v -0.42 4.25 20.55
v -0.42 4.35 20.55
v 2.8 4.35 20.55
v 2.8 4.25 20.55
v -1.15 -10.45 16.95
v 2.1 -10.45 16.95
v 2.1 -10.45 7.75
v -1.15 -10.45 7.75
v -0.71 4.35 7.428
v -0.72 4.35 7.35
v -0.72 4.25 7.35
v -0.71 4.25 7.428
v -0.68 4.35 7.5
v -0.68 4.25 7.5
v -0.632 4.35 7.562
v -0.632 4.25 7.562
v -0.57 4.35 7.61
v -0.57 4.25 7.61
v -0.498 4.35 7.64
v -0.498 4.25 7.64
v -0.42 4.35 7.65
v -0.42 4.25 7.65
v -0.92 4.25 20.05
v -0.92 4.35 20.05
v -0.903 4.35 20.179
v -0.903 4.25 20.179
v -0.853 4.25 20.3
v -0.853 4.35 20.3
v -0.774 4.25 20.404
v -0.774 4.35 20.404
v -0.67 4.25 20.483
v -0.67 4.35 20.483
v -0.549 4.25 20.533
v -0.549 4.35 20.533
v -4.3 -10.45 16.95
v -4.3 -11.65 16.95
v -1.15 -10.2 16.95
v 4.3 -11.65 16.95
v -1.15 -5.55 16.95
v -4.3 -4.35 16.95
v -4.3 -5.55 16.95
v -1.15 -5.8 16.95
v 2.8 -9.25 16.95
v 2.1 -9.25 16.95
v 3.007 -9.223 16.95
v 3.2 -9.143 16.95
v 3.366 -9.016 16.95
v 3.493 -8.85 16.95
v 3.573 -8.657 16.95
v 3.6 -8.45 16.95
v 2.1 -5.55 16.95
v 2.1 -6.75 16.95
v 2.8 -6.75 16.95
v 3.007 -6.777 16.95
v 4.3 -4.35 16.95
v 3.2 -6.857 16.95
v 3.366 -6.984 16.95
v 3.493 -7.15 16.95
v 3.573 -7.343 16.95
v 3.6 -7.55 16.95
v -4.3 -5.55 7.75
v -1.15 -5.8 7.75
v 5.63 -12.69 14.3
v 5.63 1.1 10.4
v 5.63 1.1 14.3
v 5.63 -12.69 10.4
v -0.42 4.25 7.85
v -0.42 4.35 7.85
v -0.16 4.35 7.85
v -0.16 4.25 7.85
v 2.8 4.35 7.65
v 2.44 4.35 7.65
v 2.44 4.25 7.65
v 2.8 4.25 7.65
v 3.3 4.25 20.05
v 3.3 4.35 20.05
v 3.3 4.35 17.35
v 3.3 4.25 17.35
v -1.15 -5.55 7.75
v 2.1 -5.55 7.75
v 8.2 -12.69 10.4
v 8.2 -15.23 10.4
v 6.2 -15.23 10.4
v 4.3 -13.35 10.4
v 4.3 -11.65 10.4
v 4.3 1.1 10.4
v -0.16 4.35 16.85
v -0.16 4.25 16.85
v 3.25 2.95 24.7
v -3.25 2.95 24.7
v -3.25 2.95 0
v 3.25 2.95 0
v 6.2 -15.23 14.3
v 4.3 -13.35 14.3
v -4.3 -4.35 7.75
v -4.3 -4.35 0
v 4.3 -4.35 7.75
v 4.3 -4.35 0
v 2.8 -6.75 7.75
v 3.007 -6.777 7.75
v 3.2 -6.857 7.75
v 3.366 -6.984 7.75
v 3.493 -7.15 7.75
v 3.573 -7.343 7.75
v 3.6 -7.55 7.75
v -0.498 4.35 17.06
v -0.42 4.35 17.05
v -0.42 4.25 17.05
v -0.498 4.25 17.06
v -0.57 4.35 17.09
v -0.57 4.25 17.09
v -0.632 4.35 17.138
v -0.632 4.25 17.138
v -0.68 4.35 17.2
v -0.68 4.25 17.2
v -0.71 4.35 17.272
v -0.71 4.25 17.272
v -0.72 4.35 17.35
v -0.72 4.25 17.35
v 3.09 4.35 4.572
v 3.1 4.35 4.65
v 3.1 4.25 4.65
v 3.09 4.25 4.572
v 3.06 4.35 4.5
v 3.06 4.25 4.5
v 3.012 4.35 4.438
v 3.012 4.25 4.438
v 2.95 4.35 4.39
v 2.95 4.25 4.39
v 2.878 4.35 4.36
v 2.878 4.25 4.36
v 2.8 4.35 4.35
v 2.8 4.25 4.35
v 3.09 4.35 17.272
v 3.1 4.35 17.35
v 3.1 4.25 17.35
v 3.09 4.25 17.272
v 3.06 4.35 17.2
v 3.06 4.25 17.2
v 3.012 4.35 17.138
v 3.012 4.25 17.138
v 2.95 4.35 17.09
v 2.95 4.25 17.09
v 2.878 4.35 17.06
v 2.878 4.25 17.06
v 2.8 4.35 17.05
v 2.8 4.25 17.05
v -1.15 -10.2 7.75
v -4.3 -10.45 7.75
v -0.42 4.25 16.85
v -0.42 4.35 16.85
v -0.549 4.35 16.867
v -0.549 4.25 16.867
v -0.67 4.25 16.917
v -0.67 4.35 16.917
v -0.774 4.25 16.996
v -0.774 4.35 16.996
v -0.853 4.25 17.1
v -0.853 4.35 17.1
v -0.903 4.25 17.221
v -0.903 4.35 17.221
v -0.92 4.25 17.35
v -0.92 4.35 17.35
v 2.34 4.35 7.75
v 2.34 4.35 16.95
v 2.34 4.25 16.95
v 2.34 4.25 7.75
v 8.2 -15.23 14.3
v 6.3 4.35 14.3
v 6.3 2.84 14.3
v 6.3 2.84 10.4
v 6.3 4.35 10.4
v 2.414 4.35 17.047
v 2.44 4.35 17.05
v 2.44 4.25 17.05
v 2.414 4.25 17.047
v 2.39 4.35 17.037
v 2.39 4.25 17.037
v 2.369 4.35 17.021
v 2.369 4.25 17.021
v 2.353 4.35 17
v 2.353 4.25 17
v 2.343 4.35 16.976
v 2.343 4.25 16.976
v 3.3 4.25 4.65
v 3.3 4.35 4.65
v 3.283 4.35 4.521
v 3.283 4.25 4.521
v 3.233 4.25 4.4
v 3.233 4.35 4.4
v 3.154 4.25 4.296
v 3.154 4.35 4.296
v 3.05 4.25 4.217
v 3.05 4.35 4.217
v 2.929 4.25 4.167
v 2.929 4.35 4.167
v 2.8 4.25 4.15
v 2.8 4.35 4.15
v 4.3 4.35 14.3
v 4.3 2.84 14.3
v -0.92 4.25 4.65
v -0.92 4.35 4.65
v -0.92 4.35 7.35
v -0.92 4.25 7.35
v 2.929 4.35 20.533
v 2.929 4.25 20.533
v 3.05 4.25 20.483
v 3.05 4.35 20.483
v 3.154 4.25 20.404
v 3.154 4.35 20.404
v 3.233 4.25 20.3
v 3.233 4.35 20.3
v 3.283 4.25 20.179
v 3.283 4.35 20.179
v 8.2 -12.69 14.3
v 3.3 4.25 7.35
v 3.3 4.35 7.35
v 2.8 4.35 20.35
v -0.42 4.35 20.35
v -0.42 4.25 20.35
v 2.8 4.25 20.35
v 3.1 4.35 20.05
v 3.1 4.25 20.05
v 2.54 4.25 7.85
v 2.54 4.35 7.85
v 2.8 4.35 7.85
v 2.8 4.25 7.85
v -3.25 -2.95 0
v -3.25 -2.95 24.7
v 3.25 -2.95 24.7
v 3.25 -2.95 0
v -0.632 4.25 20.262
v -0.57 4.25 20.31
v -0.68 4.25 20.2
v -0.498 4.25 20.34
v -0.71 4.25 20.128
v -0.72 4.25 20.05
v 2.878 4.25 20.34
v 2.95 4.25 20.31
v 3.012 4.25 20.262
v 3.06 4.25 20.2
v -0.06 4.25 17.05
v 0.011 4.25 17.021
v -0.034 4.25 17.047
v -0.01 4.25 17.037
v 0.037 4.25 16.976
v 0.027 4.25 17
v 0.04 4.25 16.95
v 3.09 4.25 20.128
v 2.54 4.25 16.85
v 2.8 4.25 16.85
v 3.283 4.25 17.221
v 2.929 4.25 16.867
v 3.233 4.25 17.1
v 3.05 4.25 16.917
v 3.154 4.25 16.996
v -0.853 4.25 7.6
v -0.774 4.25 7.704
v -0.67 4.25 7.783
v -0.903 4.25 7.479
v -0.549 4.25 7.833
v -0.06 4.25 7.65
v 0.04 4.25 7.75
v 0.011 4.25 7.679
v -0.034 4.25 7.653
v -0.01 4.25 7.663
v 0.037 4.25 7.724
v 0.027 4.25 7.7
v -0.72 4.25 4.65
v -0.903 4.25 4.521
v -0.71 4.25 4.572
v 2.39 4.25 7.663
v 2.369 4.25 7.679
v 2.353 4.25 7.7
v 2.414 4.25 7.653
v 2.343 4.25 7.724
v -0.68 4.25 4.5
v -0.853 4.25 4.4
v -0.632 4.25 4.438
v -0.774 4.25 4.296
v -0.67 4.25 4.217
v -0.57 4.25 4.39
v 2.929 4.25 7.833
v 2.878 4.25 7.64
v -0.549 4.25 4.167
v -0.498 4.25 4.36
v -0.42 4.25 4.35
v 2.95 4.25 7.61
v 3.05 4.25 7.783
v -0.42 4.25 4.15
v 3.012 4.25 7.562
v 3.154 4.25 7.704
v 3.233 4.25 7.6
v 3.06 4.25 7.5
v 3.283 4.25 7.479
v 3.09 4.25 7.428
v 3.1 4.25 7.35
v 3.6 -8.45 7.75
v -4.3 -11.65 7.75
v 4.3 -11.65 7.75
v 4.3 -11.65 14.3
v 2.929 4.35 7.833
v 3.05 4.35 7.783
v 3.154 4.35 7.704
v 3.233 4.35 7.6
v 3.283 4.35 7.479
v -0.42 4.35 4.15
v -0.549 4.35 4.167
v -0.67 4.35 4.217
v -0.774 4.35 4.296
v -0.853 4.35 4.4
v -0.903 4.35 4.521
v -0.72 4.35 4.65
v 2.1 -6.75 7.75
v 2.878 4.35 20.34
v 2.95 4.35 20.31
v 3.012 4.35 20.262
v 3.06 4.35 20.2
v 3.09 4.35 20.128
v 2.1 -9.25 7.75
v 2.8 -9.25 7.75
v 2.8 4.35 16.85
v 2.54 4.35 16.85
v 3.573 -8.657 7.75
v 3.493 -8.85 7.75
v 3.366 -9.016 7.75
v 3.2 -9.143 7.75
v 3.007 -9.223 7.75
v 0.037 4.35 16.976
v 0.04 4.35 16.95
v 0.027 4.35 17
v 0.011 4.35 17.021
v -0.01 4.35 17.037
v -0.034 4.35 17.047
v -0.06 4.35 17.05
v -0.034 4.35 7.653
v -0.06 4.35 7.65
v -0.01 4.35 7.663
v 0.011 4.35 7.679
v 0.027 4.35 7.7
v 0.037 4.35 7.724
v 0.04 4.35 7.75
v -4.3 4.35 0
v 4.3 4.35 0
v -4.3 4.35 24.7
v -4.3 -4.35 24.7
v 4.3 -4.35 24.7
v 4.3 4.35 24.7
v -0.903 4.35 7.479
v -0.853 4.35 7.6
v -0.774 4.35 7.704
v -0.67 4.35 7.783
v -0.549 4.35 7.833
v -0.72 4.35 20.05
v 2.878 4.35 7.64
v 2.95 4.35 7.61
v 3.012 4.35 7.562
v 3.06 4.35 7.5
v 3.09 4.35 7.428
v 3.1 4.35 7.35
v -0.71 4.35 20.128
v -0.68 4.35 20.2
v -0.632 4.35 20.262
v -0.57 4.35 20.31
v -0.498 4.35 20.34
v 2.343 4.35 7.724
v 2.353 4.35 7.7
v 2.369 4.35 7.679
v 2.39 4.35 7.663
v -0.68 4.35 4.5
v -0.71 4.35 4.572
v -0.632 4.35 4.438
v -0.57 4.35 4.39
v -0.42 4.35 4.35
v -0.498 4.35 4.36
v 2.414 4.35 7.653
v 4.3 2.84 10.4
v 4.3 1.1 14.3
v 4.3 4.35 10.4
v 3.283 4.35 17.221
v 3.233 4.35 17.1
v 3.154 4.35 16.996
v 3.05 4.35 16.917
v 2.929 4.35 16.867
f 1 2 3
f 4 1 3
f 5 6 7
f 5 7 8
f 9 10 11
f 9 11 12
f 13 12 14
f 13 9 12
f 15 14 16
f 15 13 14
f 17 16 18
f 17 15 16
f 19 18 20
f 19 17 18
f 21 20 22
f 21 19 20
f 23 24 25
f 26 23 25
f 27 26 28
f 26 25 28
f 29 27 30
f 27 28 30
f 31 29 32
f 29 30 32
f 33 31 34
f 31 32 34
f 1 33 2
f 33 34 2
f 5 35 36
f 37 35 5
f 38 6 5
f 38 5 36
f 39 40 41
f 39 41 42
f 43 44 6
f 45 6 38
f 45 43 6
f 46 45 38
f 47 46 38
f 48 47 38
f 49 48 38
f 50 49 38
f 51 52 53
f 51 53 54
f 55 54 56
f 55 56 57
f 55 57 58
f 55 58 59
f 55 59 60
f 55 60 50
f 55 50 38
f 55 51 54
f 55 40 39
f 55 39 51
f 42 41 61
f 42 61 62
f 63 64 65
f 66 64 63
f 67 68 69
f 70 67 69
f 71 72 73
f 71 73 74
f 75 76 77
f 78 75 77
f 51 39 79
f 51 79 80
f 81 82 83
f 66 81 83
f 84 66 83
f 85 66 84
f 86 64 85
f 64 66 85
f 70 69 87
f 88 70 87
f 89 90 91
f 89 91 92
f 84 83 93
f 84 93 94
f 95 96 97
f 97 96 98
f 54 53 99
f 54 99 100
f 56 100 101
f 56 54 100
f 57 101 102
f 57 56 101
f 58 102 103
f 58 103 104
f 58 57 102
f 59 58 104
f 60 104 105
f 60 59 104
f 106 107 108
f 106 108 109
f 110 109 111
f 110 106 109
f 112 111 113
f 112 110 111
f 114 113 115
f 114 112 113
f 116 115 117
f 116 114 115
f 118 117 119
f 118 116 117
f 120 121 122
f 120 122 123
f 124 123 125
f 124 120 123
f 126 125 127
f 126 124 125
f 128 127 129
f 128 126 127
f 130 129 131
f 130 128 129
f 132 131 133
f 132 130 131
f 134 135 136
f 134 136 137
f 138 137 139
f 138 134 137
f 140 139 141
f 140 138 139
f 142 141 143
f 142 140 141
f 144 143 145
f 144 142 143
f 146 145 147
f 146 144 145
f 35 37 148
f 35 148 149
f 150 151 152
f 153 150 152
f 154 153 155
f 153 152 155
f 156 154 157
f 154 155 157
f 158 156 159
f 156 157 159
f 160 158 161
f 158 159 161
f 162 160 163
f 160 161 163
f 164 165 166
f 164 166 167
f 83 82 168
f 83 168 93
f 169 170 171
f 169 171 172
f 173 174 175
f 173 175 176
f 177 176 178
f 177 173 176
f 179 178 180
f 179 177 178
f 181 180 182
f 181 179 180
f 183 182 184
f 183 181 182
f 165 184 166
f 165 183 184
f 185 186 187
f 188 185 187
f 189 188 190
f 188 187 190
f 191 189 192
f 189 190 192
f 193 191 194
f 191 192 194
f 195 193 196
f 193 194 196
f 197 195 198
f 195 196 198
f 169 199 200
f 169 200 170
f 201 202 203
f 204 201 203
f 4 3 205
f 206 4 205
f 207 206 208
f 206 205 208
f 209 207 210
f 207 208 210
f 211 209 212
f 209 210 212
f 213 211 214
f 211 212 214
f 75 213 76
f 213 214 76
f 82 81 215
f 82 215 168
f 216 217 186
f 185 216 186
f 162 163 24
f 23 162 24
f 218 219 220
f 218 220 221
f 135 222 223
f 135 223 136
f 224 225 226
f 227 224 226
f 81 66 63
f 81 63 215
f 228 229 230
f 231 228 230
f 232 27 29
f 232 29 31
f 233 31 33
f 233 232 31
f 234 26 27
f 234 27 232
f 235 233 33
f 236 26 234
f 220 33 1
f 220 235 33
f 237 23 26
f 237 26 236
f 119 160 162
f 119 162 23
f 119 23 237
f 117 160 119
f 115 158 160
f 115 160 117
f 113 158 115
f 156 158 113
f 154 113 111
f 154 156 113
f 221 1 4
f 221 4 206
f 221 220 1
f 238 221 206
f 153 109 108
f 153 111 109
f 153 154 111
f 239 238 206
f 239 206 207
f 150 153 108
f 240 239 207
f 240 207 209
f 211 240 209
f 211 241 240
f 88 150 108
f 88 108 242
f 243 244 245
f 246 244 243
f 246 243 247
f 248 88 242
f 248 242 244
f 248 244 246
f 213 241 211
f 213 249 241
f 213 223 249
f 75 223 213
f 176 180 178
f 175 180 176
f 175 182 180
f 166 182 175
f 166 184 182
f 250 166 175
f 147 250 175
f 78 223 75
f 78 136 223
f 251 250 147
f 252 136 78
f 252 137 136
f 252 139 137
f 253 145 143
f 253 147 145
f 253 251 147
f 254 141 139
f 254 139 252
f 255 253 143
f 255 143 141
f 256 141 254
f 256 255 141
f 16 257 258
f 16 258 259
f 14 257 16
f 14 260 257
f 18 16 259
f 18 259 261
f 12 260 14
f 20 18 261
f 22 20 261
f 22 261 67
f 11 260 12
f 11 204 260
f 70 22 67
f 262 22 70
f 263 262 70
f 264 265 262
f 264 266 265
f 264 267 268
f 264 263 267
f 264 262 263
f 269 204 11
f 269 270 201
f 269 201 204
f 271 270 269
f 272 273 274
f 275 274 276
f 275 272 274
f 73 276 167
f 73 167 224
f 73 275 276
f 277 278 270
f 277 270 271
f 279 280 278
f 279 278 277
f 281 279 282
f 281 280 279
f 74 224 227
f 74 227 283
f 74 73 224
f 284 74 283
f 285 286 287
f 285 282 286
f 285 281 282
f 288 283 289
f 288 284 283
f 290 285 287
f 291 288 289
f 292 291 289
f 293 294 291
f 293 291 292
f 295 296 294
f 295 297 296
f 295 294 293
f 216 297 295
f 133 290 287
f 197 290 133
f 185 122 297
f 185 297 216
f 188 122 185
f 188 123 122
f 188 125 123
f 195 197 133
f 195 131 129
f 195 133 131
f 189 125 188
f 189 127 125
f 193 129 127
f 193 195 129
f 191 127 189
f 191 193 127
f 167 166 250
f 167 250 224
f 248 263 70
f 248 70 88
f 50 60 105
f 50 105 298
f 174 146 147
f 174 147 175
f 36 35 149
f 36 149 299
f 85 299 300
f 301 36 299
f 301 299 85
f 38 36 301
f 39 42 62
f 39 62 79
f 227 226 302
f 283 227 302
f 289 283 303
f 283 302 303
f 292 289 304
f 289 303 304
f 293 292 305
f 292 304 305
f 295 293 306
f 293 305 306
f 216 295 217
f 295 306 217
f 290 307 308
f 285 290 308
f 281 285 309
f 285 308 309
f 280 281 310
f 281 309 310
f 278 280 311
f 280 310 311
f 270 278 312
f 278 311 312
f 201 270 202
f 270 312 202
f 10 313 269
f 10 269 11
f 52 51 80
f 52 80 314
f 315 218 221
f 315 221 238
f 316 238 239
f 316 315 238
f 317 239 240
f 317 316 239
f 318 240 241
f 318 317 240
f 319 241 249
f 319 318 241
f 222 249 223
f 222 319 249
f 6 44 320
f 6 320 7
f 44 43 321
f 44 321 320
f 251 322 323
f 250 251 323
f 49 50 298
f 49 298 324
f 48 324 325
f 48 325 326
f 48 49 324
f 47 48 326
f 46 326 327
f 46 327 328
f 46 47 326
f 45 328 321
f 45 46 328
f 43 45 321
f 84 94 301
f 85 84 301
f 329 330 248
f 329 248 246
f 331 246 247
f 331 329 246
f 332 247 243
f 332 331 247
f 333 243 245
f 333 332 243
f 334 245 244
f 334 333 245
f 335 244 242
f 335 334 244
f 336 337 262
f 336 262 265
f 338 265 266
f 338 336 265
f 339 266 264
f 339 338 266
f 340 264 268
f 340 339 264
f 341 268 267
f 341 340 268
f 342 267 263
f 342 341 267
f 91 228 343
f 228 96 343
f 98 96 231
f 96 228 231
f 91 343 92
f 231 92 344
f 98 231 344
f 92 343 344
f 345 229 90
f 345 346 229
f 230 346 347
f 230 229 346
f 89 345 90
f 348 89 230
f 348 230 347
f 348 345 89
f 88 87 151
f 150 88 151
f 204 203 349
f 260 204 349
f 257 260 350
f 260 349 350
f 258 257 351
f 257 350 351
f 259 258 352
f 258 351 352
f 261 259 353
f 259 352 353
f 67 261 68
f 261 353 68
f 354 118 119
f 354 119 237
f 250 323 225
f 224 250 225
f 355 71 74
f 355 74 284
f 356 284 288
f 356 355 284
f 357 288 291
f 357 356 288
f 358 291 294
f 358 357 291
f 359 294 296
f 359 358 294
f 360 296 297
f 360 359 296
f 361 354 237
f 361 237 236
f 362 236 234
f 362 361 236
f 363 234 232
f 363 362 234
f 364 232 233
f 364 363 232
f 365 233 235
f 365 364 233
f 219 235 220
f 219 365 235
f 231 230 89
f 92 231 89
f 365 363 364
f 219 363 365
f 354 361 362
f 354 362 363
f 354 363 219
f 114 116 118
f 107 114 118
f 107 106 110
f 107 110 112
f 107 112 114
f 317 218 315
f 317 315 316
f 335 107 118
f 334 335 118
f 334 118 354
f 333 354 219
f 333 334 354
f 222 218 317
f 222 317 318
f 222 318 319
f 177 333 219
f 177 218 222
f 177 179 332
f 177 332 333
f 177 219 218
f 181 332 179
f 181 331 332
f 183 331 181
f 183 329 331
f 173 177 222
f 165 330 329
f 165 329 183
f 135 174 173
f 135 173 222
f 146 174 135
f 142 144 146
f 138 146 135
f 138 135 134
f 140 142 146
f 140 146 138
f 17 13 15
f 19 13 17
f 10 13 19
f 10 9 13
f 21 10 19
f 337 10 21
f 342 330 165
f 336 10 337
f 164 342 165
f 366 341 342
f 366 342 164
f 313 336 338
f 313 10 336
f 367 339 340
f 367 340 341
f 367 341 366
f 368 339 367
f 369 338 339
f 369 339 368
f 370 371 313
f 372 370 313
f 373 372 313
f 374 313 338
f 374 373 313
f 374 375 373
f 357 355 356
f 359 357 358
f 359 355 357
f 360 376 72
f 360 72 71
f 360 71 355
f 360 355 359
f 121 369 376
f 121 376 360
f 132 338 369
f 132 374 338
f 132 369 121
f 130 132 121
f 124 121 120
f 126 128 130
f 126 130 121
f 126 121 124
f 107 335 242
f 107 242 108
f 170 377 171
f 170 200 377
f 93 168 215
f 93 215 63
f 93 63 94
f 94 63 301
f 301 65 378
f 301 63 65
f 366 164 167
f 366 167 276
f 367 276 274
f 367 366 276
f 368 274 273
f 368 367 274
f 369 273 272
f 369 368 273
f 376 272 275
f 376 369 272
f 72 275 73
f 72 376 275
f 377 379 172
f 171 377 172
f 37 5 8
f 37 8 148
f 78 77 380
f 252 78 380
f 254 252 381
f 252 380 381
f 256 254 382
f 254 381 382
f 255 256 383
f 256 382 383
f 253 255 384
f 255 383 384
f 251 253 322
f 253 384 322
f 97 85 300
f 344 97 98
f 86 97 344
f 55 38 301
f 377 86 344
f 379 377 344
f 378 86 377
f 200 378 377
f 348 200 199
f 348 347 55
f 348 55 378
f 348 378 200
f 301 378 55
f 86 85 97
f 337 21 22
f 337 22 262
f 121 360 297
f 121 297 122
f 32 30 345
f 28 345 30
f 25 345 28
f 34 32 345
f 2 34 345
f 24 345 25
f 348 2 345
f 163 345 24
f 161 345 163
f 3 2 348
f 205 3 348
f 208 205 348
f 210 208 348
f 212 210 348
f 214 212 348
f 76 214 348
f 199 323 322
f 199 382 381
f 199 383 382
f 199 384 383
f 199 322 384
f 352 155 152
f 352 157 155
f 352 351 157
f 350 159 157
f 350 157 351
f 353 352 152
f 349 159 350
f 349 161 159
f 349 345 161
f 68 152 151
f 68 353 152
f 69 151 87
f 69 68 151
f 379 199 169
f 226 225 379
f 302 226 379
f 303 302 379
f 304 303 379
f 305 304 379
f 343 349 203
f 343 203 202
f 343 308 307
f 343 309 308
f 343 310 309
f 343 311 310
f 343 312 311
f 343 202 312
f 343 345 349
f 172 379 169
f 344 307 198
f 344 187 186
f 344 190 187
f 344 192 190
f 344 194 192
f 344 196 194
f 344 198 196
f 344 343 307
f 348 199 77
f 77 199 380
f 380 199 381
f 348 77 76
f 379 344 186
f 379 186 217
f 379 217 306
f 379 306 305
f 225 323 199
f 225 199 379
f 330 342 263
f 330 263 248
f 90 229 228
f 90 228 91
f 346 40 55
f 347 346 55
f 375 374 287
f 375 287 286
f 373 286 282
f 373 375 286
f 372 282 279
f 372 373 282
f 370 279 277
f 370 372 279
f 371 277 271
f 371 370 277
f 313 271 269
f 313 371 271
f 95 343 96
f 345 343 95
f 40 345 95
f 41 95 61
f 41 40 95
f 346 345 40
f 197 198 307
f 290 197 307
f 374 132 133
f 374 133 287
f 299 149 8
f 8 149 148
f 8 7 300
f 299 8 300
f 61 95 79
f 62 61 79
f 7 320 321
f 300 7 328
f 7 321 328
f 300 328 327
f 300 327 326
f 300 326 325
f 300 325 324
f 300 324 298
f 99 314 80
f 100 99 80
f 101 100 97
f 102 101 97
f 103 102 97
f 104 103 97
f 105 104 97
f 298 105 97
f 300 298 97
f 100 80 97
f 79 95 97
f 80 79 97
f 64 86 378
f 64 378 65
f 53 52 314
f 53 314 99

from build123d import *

# Parameters (mm, degrees)
SKETCH1_W                = 8.6
SKETCH1_H                = 8.7
SKETCH1_W_2              = 6.5
SKETCH1_H_2              = 5.9
BOSS_EXTRUDE1_DEPTH      = 24.7
SKETCH2_W                = 2
SKETCH2_H                = 1.51
BOSS_EXTRUDE2_DEPTH      = 1.95
BOSS_EXTRUDE2_DEPTH_BACK = 1.95
BOSS_EXTRUDE3_DEPTH      = 4.6
BOSS_EXTRUDE3_DEPTH_BACK = 4.6
CUT_EXTRUDE1_DEPTH       = 0.1


with BuildPart() as part:
    # Sketch1 → Boss-Extrude1 (new body)
    with BuildSketch(Plane.XY):
        Rectangle(SKETCH1_W, SKETCH1_H)
        Rectangle(SKETCH1_W_2, SKETCH1_H_2, mode=Mode.SUBTRACT)
    extrude(amount=BOSS_EXTRUDE1_DEPTH)

    # Sketch2 → Boss-Extrude2 (add, two sides)
    with BuildSketch(Plane.XY.offset(12.35)) as boss_extrude2_sk:
        with Locations((5.3, 3.595)):
            Rectangle(SKETCH2_W, SKETCH2_H)
        Polygon((4.3, 1.1), (5.63, 1.1), (5.63, -12.69), (8.2, -12.69), (8.2, -15.23), (6.2, -15.23), (4.3, -13.35), align=None)
    extrude(amount=BOSS_EXTRUDE2_DEPTH)
    extrude(boss_extrude2_sk.sketch, amount=-BOSS_EXTRUDE2_DEPTH_BACK)

    # Sketch3 → Boss-Extrude3 (add, two sides)
    with BuildSketch(Plane.XY.offset(12.35)) as boss_extrude3_sk:
        with BuildLine():
            Line((4.3, -4.35), (-4.3, -4.35))
            Line((-4.3, -4.35), (-4.3, -5.55))
            Line((-4.3, -5.55), (-1.15, -5.8))
            Line((-1.15, -5.8), (-1.15, -5.55))
            Line((-1.15, -5.55), (2.1, -5.55))
            Line((2.1, -5.55), (2.1, -6.75))
            Line((2.1, -6.75), (2.8, -6.75))
            ThreePointArc((2.8, -6.75), (3.365685425, -6.984314575), (3.6, -7.55))
            Line((3.6, -7.55), (3.6, -8.45))
            ThreePointArc((3.6, -8.45), (3.365685425, -9.015685425), (2.8, -9.25))
            Line((2.8, -9.25), (2.1, -9.25))
            Line((2.1, -9.25), (2.1, -10.45))
            Line((2.1, -10.45), (-1.15, -10.45))
            Line((-1.15, -10.45), (-1.15, -10.2))
            Line((-1.15, -10.2), (-4.3, -10.45))
            Line((-4.3, -10.45), (-4.3, -11.65))
            Line((-4.3, -11.65), (4.3, -11.65))
            Line((4.3, -11.65), (4.3, -4.35))
        make_face()
    extrude(amount=BOSS_EXTRUDE3_DEPTH)
    extrude(boss_extrude3_sk.sketch, amount=-BOSS_EXTRUDE3_DEPTH_BACK)

    # Sketch4 → Cut-Extrude1 (cut)
    with BuildSketch(Plane(origin=(0, 4.35, 0), x_dir=(1, 0, 0), z_dir=(0, 1, 0))):
        with BuildLine():
            Line((-0.16, -12.35), (-0.16, -16.85))
            Line((-0.16, -16.85), (-0.42, -16.85))
            ThreePointArc((-0.42, -16.85), (-0.773553391, -16.996446609), (-0.92, -17.35))
            Line((-0.92, -17.35), (-0.92, -20.05))
            ThreePointArc((-0.92, -20.05), (-0.773553391, -20.403553391), (-0.42, -20.55))
            Line((-0.42, -20.55), (2.8, -20.55))
            ThreePointArc((2.8, -20.55), (3.153553391, -20.403553391), (3.3, -20.05))
            Line((3.3, -20.05), (3.3, -17.35))
            ThreePointArc((3.3, -17.35), (3.153553391, -16.996446609), (2.8, -16.85))
            Line((2.8, -16.85), (2.54, -16.85))
            Line((2.54, -16.85), (2.54, -12.35))
            Line((2.54, -12.35), (2.54, -7.85))
            Line((2.54, -7.85), (2.8, -7.85))
            ThreePointArc((2.8, -7.85), (3.153553391, -7.703553391), (3.3, -7.35))
            Line((3.3, -7.35), (3.3, -4.65))
            ThreePointArc((3.3, -4.65), (3.153553391, -4.296446609), (2.8, -4.15))
            Line((2.8, -4.15), (-0.42, -4.15))
            ThreePointArc((-0.42, -4.15), (-0.773553391, -4.296446609), (-0.92, -4.65))
            Line((-0.92, -4.65), (-0.92, -7.35))
            ThreePointArc((-0.92, -7.35), (-0.773553391, -7.703553391), (-0.42, -7.85))
            Line((-0.42, -7.85), (-0.16, -7.85))
            Line((-0.16, -7.85), (-0.16, -12.35))
        make_face()
        with BuildLine():
            Line((2.34, -16.95), (2.34, -7.75))
            ThreePointArc((2.34, -7.75), (2.369289322, -7.679289322), (2.44, -7.65))
            Line((2.44, -7.65), (2.8, -7.65))
            ThreePointArc((2.8, -7.65), (3.012132034, -7.562132034), (3.1, -7.35))
            Line((3.1, -7.35), (3.1, -4.65))
            ThreePointArc((3.1, -4.65), (3.012132034, -4.437867966), (2.8, -4.35))
            Line((2.8, -4.35), (-0.42, -4.35))
            ThreePointArc((-0.42, -4.35), (-0.632132034, -4.437867966), (-0.72, -4.65))
            Line((-0.72, -4.65), (-0.72, -7.35))
            ThreePointArc((-0.72, -7.35), (-0.632132034, -7.562132034), (-0.42, -7.65))
            Line((-0.42, -7.65), (-0.06, -7.65))
            ThreePointArc((-0.06, -7.65), (0.010710678, -7.679289322), (0.04, -7.75))
            Line((0.04, -7.75), (0.04, -16.95))
            ThreePointArc((0.04, -16.95), (0.010710678, -17.020710678), (-0.06, -17.05))
            Line((-0.06, -17.05), (-0.42, -17.05))
            ThreePointArc((-0.42, -17.05), (-0.632132034, -17.137867966), (-0.72, -17.35))
            Line((-0.72, -17.35), (-0.72, -20.05))
            ThreePointArc((-0.72, -20.05), (-0.632132034, -20.262132034), (-0.42, -20.35))
            Line((-0.42, -20.35), (2.8, -20.35))
            ThreePointArc((2.8, -20.35), (3.012132034, -20.262132034), (3.1, -20.05))
            Line((3.1, -20.05), (3.1, -17.35))
            ThreePointArc((3.1, -17.35), (3.012132034, -17.137867966), (2.8, -17.05))
            Line((2.8, -17.05), (2.44, -17.05))
            ThreePointArc((2.44, -17.05), (2.369289322, -17.020710678), (2.34, -16.95))
        make_face(mode=Mode.SUBTRACT)
    extrude(amount=-CUT_EXTRUDE1_DEPTH, mode=Mode.SUBTRACT)


solid = part.part
